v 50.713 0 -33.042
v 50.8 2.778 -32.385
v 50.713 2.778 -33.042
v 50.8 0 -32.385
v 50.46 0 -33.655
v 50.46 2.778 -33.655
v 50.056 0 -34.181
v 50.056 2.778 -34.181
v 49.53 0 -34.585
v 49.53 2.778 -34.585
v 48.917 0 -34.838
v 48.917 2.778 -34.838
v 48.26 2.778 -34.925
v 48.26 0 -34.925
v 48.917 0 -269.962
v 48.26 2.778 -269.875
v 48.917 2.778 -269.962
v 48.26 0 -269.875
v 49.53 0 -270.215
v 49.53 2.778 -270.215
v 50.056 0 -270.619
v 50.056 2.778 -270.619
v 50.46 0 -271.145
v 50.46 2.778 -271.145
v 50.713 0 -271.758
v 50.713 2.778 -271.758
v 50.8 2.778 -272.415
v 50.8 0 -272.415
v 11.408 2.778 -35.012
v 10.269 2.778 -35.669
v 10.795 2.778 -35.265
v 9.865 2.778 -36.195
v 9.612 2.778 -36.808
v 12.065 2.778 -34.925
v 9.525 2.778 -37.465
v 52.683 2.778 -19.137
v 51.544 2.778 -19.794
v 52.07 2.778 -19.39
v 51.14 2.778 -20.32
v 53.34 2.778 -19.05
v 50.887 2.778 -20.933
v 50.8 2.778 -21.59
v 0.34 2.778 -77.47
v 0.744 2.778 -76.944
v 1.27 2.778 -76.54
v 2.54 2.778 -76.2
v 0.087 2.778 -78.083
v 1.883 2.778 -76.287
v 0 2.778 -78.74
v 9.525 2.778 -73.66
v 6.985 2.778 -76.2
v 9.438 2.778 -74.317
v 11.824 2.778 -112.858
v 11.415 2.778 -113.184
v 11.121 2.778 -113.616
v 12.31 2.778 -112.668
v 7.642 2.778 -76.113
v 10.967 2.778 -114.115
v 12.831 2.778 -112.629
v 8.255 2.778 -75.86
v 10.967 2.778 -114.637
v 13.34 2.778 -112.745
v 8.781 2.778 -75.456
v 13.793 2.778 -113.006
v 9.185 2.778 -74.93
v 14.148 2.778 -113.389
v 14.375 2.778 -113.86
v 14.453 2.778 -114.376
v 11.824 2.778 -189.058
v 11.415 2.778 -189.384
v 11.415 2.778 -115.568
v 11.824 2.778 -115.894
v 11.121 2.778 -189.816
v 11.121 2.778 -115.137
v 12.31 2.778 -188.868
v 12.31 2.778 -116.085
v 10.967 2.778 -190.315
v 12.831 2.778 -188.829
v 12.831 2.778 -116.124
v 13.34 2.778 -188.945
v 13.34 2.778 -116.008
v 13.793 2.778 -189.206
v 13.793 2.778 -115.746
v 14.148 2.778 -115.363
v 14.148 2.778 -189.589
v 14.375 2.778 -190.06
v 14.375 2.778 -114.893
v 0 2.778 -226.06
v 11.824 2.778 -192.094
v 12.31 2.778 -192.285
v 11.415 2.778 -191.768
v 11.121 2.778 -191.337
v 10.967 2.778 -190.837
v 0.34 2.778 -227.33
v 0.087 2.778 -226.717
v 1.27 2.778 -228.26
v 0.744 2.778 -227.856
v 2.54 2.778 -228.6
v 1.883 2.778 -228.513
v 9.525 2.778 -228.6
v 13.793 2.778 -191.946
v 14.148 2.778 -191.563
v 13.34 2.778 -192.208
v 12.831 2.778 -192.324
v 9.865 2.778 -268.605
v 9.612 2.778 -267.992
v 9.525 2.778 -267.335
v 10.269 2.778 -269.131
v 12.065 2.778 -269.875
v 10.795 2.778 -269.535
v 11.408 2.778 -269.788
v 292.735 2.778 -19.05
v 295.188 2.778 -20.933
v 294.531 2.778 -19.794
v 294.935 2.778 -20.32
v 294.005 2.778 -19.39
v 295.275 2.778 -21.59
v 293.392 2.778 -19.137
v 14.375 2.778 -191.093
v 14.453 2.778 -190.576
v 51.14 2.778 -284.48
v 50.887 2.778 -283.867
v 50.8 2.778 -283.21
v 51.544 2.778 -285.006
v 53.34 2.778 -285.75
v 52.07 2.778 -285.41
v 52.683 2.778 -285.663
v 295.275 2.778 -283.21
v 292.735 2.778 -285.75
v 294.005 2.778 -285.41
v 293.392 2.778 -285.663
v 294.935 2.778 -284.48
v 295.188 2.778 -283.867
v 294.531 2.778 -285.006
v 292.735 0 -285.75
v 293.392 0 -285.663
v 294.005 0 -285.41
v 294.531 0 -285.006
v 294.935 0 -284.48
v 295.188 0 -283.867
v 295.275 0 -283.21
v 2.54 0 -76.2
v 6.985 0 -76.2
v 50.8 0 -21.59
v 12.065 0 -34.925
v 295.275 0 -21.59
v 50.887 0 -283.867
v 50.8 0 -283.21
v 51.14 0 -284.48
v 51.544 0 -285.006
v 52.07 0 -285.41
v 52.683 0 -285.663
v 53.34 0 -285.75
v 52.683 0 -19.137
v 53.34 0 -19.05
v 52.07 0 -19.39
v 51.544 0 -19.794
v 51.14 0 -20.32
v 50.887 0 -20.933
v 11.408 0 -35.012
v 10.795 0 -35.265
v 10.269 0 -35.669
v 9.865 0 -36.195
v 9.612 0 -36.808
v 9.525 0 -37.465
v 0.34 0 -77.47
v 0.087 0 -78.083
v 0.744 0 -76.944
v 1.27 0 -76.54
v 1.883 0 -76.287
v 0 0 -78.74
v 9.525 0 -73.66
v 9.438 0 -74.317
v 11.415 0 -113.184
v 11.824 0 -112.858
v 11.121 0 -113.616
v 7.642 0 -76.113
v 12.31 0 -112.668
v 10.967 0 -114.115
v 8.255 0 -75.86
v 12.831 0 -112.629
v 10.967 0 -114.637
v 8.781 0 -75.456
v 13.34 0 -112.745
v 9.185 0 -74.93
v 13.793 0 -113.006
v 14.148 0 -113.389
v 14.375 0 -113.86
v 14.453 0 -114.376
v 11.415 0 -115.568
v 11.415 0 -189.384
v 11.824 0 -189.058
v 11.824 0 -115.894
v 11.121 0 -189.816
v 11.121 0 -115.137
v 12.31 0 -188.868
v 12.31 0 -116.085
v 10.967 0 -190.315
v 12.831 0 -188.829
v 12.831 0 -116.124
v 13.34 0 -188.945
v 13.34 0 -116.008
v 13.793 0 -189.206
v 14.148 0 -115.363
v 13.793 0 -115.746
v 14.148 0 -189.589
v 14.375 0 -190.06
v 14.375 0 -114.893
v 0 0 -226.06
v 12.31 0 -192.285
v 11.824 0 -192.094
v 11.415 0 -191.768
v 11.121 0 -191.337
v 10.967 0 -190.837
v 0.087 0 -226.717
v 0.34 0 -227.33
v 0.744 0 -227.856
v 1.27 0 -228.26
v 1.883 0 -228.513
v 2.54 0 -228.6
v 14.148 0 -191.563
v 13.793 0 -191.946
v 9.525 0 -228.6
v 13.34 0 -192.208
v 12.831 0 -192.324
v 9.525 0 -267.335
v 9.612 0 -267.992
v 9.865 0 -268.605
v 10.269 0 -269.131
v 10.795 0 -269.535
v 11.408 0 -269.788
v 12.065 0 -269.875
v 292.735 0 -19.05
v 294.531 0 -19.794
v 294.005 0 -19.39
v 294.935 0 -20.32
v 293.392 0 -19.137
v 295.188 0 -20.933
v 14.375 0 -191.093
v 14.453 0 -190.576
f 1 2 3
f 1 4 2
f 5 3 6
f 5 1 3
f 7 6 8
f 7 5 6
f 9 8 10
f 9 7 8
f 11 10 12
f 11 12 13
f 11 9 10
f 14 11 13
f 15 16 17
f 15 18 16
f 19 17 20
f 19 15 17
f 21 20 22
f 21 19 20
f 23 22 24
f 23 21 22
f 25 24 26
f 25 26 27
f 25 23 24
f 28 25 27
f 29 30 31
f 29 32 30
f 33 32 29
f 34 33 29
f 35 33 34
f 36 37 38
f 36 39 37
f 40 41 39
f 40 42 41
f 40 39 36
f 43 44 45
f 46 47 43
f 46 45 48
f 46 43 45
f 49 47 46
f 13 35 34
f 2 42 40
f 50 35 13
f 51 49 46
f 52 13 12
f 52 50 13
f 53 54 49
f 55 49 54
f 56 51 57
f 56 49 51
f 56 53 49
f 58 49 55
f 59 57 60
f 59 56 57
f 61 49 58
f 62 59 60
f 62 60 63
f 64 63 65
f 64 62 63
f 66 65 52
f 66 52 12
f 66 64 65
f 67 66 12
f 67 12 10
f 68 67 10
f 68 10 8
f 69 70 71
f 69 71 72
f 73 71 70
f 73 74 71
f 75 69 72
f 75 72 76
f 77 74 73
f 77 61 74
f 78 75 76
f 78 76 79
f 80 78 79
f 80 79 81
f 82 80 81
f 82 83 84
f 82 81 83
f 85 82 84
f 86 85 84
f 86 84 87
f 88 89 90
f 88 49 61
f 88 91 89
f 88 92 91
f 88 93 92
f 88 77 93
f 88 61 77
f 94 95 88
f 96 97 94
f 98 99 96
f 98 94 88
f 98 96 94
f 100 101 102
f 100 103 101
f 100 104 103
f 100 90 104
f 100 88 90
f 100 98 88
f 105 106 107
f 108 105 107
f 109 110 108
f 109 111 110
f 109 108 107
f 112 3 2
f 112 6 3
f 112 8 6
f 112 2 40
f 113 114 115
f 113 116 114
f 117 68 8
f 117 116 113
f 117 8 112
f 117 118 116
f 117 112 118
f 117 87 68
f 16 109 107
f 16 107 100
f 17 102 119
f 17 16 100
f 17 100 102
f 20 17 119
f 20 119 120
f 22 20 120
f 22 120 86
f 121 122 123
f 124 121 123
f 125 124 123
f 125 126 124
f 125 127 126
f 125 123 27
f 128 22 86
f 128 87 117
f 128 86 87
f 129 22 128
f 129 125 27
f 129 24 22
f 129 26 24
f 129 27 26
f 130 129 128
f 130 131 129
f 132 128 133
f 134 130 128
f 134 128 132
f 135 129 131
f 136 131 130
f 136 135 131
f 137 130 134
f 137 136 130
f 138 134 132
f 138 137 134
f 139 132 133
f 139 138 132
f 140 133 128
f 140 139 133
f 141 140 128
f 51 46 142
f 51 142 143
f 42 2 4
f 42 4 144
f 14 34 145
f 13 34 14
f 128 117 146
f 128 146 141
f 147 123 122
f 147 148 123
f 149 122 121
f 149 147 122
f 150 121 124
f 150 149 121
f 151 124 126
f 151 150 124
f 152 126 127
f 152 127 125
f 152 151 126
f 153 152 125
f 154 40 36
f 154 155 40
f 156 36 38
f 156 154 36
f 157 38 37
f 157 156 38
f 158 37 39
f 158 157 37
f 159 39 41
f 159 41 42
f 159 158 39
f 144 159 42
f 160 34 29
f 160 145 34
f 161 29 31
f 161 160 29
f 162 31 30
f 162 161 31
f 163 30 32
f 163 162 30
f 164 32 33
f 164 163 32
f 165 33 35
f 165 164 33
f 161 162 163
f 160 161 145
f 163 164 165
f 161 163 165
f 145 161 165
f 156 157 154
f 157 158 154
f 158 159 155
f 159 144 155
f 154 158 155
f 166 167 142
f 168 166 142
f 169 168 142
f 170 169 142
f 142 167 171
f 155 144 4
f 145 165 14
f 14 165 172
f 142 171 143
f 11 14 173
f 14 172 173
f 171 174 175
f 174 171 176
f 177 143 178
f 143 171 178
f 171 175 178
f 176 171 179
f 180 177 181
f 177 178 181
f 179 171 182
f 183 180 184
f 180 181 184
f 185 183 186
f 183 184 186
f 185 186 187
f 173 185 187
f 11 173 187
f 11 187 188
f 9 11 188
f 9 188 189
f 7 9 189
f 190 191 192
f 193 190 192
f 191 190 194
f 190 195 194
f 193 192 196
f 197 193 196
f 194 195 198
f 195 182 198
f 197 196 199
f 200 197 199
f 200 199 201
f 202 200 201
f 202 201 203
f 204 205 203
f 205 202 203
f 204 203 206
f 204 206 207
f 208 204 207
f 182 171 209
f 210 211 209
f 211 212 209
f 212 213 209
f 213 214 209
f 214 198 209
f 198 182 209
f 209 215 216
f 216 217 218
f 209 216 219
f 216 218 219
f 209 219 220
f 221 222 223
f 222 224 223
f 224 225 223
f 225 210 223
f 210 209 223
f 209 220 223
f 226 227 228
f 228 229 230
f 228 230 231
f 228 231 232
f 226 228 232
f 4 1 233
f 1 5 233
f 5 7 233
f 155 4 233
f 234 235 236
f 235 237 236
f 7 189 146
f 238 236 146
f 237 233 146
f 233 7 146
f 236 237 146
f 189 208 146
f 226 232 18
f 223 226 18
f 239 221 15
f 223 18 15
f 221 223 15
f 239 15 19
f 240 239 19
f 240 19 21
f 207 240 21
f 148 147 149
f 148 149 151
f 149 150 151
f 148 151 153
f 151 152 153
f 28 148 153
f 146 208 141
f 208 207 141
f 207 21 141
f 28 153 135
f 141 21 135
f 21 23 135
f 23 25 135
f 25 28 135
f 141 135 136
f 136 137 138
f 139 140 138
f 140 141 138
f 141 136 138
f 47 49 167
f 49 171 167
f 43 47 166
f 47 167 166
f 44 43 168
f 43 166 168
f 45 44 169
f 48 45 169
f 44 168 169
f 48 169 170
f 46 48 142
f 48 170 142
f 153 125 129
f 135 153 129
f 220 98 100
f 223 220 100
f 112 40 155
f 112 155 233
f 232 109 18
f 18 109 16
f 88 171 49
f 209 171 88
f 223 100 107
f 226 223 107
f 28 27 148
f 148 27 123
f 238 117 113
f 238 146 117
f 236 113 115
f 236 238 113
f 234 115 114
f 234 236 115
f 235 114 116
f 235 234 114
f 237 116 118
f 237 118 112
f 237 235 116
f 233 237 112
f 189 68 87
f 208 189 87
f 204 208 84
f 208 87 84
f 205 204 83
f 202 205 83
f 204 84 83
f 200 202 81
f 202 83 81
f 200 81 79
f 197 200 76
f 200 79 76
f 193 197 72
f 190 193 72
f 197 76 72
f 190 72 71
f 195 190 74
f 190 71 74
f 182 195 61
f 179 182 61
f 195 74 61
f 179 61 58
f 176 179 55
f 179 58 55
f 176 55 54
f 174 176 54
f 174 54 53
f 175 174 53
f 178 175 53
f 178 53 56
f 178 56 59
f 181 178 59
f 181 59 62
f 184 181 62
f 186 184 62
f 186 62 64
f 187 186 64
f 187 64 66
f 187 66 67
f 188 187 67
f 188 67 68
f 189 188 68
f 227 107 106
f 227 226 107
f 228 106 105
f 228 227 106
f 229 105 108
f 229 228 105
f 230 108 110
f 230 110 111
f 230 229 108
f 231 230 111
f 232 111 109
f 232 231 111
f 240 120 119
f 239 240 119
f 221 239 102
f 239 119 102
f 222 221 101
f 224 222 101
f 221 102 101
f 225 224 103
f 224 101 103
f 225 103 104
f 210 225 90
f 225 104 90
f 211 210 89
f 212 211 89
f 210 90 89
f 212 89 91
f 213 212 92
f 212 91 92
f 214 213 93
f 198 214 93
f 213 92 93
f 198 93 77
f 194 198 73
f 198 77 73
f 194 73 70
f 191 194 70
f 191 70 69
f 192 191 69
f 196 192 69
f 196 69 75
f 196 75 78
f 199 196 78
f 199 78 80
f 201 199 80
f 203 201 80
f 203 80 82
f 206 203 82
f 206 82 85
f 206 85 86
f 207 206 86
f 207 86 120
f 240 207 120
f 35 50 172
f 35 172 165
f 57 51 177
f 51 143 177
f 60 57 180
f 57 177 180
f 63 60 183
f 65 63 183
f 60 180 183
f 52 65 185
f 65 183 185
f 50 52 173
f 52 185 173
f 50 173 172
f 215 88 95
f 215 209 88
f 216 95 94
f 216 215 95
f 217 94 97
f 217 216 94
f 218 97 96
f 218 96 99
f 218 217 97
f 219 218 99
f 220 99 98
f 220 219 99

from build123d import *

# Parameters (mm, degrees)
SKETCH1_W           = 304.8
SKETCH1_H           = 304.8
BOSS_EXTRUDE1_DEPTH = 2.778125
SKETCH2_W           = 304.8
SKETCH2_H           = 19.05
CUT_EXTRUDE1_DEPTH  = 3.778125
CUT_EXTRUDE2_DEPTH  = 3.778125
SKETCH4_R           = 1.7526
CUT_EXTRUDE3_DEPTH  = 3.778125
SKETCH5_W           = 9.525
SKETCH5_H           = 266.7
CUT_EXTRUDE4_DEPTH  = 3.778125
FILLET1_R           = 2.54


with BuildPart() as part:
    # Sketch1 → Boss-Extrude1 (new body)
    with BuildSketch(Plane(origin=(0, 0, 0), x_dir=(1, 0, 0), z_dir=(0, 1, 0))):
        with Locations((152.4, 152.4)):
            Rectangle(SKETCH1_W, SKETCH1_H)
    extrude(amount=BOSS_EXTRUDE1_DEPTH)

    # Sketch2 → Cut-Extrude1 (cut, through all)
    with BuildSketch(Plane(origin=(0, 2.778125, 0), x_dir=(1, 0, 0), z_dir=(0, 1, 0))):
        with Locations((152.4, 9.525)):
            Rectangle(SKETCH2_W, SKETCH2_H)
        with Locations((152.4, 295.275)):
            Rectangle(SKETCH2_W, SKETCH2_H)
    extrude(amount=-CUT_EXTRUDE1_DEPTH, mode=Mode.SUBTRACT)

    # Sketch3 → Cut-Extrude2 (cut, through all)
    with BuildSketch(Plane(origin=(0, 2.778125, 0), x_dir=(1, 0, 0), z_dir=(0, 1, 0))):
        Polygon((50.8, 285.75), (0, 285.75), (0, 228.6), (9.525, 228.6), (9.525, 269.875), (50.8, 269.875), align=None)
        Polygon((0, 19.05), (0, 76.2), (9.525, 76.2), (9.525, 34.925), (50.8, 34.925), (50.8, 19.05), align=None)
    extrude(amount=-CUT_EXTRUDE2_DEPTH, mode=Mode.SUBTRACT)

    # Sketch4 → Cut-Extrude3 (cut, through all)
    with BuildSketch(Plane(origin=(0, 2.778125, 0), x_dir=(1, 0, 0), z_dir=(0, 1, 0))):
        with Locations((12.7, 190.5762)):
            Circle(SKETCH4_R)
        with Locations((12.7, 114.3762)):
            Circle(SKETCH4_R)
    extrude(amount=-CUT_EXTRUDE3_DEPTH, mode=Mode.SUBTRACT)

    # Sketch5 → Cut-Extrude4 (cut, through all)
    with BuildSketch(Plane(origin=(0, 2.778125, 0), x_dir=(1, 0, 0), z_dir=(0, 1, 0))):
        with Locations((300.0375, 152.4)):
            Rectangle(SKETCH5_W, SKETCH5_H)
    extrude(amount=-CUT_EXTRUDE4_DEPTH, mode=Mode.SUBTRACT)

    # Fillet1
    fillet1_edges = [part.edges().sort_by_distance(p)[0] for p in [
        (295.275, 1.3890625, -19.05),
        (295.275, 1.3890625, -285.75),
        (50.8, 1.3890625, -285.75),
        (50.8, 1.3890625, -269.875),
        (9.525, 1.3890625, -269.875),
        (0, 1.3890625, -228.6),
        (50.8, 1.3890625, -19.05),
        (0, 1.3890625, -76.2),
        (9.525, 1.3890625, -76.2),
        (9.525, 1.3890625, -34.925),
        (50.8, 1.3890625, -34.925),
    ]]
    fillet(fillet1_edges, radius=FILLET1_R)


solid = part.part
